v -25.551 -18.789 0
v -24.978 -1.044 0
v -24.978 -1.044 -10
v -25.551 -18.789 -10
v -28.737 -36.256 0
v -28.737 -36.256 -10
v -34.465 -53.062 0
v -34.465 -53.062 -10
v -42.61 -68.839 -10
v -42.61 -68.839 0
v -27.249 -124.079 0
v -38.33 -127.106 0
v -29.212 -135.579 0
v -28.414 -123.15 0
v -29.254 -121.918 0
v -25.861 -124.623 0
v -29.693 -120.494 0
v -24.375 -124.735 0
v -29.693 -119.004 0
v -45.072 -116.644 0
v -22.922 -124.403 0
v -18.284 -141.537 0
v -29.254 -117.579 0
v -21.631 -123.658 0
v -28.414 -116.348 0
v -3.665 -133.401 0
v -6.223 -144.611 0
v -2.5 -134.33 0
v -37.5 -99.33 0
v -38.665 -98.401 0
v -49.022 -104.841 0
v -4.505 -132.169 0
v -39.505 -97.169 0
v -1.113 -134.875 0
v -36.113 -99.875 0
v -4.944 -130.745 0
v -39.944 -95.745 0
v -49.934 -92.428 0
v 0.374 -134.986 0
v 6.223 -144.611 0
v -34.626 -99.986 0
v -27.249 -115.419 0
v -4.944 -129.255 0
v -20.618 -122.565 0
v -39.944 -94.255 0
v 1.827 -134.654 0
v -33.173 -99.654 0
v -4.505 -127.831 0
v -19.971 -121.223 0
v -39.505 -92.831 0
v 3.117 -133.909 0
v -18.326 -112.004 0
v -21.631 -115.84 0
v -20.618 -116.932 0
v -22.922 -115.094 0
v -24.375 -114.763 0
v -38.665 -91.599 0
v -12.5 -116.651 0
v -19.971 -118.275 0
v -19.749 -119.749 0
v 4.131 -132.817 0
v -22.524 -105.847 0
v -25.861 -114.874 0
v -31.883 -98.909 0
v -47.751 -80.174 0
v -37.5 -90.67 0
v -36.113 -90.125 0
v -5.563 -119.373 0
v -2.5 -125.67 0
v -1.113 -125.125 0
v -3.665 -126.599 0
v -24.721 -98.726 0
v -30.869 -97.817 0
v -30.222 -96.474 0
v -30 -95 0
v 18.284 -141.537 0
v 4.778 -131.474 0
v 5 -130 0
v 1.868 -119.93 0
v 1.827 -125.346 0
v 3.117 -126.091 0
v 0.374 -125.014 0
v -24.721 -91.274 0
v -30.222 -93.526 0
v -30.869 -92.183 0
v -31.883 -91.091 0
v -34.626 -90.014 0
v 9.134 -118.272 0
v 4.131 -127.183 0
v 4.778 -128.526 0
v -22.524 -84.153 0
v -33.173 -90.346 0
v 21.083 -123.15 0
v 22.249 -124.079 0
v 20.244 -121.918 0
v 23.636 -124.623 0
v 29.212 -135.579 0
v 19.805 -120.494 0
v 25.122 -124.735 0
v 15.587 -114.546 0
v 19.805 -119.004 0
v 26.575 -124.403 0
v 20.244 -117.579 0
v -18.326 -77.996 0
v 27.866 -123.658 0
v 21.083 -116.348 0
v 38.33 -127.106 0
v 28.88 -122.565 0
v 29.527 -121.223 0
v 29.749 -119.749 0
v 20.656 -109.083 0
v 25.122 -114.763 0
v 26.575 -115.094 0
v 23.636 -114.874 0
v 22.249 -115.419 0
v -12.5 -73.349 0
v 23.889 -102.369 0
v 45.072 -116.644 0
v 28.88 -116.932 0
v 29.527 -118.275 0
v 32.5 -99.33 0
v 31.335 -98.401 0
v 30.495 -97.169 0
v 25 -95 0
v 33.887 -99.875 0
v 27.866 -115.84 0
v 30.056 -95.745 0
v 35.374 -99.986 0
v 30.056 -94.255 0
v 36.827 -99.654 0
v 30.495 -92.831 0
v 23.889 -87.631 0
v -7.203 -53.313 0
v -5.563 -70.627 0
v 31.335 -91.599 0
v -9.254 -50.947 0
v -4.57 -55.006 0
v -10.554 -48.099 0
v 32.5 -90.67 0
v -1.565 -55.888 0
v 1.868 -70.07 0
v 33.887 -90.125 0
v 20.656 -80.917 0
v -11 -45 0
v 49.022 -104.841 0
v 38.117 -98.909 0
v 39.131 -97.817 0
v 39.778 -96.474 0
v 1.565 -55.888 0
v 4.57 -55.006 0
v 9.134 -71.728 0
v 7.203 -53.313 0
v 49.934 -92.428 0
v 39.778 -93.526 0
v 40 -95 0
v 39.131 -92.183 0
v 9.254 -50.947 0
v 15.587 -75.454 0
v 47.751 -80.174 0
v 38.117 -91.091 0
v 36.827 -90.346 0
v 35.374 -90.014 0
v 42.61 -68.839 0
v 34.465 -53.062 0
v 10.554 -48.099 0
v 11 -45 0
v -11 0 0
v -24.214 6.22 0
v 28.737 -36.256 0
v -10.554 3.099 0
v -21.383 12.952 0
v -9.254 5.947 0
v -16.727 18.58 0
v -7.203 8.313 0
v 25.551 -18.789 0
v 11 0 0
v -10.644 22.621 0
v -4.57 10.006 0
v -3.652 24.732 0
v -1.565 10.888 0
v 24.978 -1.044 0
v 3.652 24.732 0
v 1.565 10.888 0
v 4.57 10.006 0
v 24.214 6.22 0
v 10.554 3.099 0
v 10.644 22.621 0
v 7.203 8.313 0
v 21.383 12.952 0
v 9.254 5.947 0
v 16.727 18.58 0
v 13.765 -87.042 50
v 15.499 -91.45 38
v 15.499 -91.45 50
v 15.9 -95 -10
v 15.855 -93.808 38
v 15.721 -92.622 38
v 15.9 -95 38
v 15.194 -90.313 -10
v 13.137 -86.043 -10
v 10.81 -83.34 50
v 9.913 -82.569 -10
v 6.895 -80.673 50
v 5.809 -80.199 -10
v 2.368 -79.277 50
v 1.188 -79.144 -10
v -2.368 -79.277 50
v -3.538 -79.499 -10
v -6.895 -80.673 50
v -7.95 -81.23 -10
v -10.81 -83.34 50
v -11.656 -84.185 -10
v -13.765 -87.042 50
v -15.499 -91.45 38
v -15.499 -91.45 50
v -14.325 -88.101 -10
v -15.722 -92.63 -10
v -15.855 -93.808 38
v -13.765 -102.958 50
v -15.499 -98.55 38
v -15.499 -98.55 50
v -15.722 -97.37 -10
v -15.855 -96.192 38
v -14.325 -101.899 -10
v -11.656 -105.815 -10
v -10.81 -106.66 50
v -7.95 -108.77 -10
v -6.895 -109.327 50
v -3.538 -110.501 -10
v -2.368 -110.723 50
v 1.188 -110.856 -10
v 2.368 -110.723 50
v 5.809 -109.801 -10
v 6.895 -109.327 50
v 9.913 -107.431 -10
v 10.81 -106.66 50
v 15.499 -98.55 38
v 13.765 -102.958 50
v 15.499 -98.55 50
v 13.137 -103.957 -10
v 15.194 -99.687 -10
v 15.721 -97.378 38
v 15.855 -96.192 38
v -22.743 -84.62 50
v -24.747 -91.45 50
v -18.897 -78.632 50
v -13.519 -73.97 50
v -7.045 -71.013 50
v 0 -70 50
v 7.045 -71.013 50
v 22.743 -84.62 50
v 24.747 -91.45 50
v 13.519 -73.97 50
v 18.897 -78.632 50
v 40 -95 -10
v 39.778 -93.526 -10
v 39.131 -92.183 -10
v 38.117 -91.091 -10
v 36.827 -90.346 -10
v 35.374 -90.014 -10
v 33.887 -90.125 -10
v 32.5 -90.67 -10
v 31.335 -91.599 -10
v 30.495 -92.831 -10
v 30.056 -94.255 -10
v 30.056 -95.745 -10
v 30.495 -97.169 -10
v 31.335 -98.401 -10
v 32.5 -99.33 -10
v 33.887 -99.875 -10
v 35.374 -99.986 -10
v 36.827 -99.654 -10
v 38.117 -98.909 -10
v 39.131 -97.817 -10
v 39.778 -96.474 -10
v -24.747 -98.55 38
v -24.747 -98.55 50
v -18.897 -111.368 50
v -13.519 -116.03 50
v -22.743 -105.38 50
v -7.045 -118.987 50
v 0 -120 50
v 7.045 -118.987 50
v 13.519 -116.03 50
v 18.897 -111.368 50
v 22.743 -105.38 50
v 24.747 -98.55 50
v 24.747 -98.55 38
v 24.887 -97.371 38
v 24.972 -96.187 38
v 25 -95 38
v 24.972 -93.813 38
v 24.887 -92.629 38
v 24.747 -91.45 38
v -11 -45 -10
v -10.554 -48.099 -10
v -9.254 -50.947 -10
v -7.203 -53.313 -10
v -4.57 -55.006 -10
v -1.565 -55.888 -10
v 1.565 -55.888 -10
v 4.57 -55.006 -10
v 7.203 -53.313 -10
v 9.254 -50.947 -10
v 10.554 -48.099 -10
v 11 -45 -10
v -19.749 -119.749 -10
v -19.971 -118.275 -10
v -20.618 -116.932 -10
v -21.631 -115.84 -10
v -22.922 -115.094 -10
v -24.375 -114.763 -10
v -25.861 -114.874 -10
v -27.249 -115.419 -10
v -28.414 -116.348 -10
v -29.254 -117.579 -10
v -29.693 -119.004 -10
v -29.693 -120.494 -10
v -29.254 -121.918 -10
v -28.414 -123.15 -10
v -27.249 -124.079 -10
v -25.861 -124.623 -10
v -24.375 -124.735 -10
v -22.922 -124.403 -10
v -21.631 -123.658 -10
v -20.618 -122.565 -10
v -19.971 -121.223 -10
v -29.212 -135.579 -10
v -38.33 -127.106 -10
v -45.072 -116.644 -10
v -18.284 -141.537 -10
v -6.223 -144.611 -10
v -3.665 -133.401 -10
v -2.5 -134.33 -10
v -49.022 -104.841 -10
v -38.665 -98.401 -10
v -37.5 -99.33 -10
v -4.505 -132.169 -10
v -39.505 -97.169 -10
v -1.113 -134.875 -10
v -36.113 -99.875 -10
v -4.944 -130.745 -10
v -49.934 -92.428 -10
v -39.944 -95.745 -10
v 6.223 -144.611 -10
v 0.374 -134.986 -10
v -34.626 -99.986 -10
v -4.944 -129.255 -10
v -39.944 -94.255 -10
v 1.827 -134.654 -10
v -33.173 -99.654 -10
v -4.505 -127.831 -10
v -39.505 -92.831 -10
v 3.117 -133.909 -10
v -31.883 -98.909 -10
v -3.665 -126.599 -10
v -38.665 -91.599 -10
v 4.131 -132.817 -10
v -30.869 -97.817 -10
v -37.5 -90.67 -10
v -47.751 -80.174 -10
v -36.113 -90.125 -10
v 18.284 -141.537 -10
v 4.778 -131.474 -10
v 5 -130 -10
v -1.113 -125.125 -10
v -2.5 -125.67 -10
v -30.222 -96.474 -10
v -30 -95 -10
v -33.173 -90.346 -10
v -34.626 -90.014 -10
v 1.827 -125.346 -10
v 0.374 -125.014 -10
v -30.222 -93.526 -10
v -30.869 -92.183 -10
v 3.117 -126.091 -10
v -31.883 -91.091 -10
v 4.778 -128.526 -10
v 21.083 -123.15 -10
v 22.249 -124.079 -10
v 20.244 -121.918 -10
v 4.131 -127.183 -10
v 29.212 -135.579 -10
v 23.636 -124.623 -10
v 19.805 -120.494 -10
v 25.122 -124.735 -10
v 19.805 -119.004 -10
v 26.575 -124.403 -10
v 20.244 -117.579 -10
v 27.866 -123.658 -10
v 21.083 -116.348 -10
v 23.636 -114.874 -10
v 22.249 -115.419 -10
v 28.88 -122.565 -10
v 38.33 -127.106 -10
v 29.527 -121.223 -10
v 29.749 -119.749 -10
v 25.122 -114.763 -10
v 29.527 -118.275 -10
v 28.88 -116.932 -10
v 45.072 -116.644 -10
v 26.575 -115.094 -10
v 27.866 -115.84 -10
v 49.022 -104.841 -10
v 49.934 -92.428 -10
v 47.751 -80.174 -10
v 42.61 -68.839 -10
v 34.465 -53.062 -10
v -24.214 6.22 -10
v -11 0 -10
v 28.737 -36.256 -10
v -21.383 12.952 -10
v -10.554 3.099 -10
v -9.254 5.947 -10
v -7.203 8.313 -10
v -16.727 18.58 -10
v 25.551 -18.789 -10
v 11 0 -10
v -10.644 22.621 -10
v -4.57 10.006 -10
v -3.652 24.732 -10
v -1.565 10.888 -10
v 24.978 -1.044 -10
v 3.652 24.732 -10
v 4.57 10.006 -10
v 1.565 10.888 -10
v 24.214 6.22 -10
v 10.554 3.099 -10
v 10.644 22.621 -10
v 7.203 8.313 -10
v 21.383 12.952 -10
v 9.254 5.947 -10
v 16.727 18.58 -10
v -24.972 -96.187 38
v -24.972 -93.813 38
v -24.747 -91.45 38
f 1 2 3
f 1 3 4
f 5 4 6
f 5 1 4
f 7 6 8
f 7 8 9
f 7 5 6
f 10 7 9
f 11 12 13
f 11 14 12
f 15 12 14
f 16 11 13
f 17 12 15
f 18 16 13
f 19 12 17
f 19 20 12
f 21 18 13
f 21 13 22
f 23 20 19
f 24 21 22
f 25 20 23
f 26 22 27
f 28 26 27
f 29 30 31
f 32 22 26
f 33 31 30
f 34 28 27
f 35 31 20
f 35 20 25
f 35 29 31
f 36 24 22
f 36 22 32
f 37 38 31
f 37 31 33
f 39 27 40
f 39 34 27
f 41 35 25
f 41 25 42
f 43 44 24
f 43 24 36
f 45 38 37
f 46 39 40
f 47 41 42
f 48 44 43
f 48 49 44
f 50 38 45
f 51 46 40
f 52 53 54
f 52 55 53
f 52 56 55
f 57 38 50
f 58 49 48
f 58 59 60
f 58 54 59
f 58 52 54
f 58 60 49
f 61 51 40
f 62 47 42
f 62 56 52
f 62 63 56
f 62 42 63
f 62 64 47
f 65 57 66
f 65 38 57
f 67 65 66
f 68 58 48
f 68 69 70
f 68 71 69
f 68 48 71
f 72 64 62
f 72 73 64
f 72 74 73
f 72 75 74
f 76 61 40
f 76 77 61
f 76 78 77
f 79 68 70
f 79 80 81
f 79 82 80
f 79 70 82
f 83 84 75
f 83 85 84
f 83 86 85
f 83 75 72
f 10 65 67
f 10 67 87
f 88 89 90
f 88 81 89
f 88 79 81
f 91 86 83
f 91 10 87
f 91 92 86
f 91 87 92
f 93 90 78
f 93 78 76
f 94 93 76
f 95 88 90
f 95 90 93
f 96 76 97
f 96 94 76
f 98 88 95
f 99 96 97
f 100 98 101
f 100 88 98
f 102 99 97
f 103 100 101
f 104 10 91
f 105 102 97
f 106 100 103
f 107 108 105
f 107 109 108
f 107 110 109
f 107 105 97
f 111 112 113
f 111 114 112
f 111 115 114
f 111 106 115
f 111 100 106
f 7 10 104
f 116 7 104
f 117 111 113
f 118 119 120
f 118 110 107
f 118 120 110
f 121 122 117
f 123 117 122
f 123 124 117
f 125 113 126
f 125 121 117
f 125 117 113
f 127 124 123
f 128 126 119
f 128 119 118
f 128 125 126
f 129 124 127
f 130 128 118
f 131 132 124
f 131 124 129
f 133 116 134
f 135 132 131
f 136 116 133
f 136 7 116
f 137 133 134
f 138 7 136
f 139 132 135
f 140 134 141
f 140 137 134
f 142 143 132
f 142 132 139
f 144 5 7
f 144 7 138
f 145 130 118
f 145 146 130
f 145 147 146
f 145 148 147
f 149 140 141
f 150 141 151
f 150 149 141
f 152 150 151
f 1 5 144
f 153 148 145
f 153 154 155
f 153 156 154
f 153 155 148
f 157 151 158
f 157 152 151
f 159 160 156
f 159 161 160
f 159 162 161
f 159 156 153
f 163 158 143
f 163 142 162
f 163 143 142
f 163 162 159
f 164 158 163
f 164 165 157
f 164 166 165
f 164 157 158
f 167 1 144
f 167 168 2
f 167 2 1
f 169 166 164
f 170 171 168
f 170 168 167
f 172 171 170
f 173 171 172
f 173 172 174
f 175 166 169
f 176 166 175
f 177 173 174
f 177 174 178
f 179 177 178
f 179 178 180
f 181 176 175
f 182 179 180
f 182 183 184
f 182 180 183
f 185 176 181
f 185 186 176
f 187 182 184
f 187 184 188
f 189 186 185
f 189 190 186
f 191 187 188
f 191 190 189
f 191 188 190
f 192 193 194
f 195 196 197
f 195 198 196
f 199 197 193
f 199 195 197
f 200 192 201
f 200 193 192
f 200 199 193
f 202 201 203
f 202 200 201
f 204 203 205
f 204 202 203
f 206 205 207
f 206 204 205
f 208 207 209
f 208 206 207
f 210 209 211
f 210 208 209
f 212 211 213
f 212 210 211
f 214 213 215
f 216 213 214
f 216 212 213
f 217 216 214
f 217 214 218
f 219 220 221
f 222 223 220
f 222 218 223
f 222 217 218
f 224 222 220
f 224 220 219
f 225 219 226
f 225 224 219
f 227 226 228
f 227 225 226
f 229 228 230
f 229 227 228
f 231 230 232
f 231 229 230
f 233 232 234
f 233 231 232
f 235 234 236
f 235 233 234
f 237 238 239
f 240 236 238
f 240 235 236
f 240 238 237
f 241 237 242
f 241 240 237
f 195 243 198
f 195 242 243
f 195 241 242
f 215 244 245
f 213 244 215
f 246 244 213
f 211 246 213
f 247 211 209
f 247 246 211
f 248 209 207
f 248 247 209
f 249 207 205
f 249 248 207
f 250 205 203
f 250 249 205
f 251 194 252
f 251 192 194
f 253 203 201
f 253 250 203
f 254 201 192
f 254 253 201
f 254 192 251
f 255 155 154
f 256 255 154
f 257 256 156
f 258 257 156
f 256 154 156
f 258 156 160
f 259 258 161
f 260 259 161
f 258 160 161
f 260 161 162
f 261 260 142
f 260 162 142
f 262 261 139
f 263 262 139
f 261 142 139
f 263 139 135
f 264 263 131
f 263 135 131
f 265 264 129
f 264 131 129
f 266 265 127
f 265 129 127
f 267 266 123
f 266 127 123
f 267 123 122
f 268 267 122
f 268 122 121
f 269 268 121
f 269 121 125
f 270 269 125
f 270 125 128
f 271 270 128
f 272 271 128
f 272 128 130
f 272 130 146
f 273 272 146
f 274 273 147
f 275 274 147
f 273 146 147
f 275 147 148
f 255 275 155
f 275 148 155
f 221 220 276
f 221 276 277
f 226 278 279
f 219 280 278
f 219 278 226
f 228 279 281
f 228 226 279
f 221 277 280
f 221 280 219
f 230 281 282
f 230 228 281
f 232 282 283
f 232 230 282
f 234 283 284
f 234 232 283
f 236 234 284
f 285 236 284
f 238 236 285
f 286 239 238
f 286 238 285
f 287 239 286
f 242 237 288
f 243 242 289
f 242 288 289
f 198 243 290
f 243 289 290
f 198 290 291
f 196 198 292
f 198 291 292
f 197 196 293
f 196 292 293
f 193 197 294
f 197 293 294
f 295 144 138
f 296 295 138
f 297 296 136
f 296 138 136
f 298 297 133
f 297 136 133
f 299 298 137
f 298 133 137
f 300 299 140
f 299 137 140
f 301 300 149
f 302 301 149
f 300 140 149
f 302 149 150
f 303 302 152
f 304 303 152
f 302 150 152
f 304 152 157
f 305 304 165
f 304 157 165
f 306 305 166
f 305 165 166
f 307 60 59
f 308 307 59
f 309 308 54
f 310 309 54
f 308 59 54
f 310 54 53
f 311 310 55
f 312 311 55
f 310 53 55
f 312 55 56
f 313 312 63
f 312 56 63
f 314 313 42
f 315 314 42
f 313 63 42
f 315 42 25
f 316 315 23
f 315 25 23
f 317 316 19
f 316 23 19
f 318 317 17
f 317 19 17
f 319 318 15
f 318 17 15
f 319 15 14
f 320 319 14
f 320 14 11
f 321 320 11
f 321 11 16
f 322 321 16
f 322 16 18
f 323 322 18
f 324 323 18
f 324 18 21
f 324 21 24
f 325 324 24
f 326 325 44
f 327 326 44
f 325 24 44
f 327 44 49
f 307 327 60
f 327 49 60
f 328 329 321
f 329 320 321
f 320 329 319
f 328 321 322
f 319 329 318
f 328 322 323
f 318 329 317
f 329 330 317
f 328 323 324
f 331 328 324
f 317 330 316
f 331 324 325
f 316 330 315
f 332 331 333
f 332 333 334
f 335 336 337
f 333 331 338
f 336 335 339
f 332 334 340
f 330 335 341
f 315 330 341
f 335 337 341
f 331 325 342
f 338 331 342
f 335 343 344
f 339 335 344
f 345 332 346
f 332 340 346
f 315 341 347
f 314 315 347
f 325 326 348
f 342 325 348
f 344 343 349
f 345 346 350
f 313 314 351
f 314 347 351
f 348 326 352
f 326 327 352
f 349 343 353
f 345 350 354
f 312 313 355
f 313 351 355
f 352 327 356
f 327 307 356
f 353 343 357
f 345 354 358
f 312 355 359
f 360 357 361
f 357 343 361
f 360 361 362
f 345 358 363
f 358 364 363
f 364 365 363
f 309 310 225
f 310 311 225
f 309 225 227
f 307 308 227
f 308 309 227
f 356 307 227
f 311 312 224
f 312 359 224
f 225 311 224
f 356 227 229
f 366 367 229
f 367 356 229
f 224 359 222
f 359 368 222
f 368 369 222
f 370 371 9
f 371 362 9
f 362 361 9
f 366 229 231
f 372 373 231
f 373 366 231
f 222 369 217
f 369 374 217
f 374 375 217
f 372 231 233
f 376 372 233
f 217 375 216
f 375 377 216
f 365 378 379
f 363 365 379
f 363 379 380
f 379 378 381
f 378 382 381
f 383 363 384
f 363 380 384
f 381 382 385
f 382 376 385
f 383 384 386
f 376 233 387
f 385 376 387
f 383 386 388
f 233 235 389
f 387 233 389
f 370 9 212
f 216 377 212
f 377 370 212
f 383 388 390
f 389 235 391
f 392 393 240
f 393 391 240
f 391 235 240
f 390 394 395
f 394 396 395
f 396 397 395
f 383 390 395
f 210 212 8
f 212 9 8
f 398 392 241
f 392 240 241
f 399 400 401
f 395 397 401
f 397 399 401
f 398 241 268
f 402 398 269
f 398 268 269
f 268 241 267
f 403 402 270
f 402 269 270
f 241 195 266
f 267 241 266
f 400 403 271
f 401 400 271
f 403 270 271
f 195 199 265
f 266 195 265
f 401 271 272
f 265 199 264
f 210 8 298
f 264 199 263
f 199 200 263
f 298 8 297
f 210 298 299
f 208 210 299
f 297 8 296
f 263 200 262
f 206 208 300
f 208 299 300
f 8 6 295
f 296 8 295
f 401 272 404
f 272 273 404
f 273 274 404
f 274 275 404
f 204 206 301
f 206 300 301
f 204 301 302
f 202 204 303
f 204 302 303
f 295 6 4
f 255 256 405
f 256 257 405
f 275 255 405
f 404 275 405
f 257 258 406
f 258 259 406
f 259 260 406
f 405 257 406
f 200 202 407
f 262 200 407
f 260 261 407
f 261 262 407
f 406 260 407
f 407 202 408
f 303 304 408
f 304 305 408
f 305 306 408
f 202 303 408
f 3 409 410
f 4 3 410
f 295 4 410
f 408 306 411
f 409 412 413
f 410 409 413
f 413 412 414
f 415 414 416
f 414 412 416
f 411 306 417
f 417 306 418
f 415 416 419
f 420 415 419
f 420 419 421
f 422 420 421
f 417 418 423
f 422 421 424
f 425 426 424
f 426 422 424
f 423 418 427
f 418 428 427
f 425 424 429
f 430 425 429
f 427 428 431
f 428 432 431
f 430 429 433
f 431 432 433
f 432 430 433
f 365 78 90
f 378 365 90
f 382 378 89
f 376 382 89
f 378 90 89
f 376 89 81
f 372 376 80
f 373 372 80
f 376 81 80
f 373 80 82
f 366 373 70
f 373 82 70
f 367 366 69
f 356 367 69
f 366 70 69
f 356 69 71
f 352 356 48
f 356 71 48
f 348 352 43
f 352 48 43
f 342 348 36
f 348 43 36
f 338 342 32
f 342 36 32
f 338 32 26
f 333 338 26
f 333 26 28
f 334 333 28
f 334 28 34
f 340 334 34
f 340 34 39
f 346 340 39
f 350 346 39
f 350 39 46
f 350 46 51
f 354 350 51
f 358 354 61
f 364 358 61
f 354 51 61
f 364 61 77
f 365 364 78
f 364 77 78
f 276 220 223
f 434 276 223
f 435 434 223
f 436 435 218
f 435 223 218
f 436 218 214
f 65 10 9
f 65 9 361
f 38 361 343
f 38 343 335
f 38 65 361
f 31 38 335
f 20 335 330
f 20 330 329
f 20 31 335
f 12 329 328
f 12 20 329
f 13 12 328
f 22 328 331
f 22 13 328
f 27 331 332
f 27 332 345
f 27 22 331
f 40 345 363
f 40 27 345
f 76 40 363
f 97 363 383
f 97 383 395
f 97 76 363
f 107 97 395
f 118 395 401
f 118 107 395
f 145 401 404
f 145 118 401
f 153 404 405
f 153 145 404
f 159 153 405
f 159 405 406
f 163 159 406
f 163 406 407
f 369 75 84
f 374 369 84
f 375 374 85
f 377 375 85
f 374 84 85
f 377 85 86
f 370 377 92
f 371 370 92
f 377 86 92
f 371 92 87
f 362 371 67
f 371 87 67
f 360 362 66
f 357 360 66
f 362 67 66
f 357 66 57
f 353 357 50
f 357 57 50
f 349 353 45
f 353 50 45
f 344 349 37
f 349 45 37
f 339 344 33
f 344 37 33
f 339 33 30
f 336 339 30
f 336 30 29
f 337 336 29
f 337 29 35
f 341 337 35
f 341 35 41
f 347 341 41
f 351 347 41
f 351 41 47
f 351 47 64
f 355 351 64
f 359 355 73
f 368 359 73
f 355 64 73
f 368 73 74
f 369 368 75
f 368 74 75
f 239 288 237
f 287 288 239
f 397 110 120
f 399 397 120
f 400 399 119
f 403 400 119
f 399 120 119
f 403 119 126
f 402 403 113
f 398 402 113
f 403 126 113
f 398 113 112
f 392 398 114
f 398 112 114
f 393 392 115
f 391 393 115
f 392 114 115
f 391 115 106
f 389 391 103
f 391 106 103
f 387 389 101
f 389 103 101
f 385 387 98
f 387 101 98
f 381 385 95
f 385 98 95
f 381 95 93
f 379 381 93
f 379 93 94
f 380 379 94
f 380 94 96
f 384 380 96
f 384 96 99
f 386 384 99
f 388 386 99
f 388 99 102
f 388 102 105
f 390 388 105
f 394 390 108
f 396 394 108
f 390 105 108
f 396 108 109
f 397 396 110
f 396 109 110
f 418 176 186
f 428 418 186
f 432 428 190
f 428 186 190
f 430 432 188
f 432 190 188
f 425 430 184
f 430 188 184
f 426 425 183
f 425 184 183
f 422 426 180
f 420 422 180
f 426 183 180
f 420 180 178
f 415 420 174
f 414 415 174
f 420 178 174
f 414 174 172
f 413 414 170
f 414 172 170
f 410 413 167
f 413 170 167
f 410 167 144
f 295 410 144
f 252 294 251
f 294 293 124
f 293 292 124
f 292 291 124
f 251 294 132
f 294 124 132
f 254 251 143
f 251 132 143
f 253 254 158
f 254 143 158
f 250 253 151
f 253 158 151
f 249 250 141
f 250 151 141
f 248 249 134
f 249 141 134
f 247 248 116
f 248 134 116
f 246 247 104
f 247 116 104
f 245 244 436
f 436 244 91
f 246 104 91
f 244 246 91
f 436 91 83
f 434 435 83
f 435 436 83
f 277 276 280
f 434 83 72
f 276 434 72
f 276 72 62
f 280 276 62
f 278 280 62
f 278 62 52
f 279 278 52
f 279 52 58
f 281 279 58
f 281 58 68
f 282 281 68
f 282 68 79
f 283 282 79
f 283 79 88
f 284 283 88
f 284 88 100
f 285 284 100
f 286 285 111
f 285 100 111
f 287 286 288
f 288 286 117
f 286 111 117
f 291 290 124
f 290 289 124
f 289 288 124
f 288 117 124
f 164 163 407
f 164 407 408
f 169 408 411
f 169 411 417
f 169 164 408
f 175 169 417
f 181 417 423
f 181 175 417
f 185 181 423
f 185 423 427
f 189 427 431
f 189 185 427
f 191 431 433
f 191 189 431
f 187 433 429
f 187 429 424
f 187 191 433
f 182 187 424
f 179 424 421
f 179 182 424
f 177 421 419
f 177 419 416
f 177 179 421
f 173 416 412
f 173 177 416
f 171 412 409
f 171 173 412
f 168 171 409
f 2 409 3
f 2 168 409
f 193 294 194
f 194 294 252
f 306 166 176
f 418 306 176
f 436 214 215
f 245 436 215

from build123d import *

# Parameters (mm, degrees)
F0_R     = 15.9
F1_DEPTH = 10
F3_DEPTH = 10
F4_R     = 5
F5_DEPTH = 10
F6_R     = 25
F6_R_2   = 15.9
F7_DEPTH = 50
F8_W     = 7.1
F8_H     = 12
F9_DEPTH = 25


with BuildPart() as f1:
    # F0 (on Top) → F1 (new body)
    with BuildSketch(Plane.XY):
        with BuildLine():
            ThreePointArc((42.6098881125, -68.8390092879), (28.7369466924, -36.2564924246), (24.9782102729, -1.0435571688))
            ThreePointArc((24.9782102729, -1.0435571688), (0, 25), (-24.9782102729, -1.0435571688))
            ThreePointArc((-24.9782102729, -1.0435571688), (-28.7369466924, -36.2564924246), (-42.6098881125, -68.8390092879))
            ThreePointArc((-42.6098881125, -68.8390092879), (0, -145), (42.6098881125, -68.8390092879))
        make_face()
        with Locations((0, -95)):
            Circle(F0_R, mode=Mode.SUBTRACT)
    extrude(amount=-F1_DEPTH)

    # F2 (on Top) → F3 (cut, through all)
    with BuildSketch(Plane.XY):
        with BuildLine():
            Line((-11, 0), (-11, -45))
            ThreePointArc((-11, -45), (0, -56), (11, -45))
            Line((11, -45), (11, 0))
            ThreePointArc((11, 0), (0, 11), (-11, 0))
        make_face()
    extrude(amount=-F3_DEPTH, mode=Mode.SUBTRACT)

    # F4 (on face) → F5 (cut, through all)
    with BuildSketch(Plane.XY):
        with Locations((-35, -95)):
            Circle(F4_R)
        with Locations((-24.7487373415, -119.7487373415)):
            Circle(F4_R)
        with Locations((0, -130)):
            Circle(F4_R)
        with Locations((24.7487373415, -119.7487373415)):
            Circle(F4_R)
        with Locations((35, -95)):
            Circle(F4_R)
    extrude(amount=-F5_DEPTH, mode=Mode.SUBTRACT)

    # F6 (on face) → F7 (join)
    with BuildSketch(Plane.XY):
        with Locations((0, -95)):
            Circle(F6_R)
        with Locations((0, -95)):
            Circle(F6_R_2, mode=Mode.SUBTRACT)
    extrude(amount=F7_DEPTH)

    # F8 (on Right) → F9 (cut, symmetric)
    with BuildSketch(Plane.YZ):
        with Locations((-95, 44)):
            Rectangle(F8_W, F8_H)
    extrude(amount=F9_DEPTH, both=True, mode=Mode.SUBTRACT)


solid = f1.part
